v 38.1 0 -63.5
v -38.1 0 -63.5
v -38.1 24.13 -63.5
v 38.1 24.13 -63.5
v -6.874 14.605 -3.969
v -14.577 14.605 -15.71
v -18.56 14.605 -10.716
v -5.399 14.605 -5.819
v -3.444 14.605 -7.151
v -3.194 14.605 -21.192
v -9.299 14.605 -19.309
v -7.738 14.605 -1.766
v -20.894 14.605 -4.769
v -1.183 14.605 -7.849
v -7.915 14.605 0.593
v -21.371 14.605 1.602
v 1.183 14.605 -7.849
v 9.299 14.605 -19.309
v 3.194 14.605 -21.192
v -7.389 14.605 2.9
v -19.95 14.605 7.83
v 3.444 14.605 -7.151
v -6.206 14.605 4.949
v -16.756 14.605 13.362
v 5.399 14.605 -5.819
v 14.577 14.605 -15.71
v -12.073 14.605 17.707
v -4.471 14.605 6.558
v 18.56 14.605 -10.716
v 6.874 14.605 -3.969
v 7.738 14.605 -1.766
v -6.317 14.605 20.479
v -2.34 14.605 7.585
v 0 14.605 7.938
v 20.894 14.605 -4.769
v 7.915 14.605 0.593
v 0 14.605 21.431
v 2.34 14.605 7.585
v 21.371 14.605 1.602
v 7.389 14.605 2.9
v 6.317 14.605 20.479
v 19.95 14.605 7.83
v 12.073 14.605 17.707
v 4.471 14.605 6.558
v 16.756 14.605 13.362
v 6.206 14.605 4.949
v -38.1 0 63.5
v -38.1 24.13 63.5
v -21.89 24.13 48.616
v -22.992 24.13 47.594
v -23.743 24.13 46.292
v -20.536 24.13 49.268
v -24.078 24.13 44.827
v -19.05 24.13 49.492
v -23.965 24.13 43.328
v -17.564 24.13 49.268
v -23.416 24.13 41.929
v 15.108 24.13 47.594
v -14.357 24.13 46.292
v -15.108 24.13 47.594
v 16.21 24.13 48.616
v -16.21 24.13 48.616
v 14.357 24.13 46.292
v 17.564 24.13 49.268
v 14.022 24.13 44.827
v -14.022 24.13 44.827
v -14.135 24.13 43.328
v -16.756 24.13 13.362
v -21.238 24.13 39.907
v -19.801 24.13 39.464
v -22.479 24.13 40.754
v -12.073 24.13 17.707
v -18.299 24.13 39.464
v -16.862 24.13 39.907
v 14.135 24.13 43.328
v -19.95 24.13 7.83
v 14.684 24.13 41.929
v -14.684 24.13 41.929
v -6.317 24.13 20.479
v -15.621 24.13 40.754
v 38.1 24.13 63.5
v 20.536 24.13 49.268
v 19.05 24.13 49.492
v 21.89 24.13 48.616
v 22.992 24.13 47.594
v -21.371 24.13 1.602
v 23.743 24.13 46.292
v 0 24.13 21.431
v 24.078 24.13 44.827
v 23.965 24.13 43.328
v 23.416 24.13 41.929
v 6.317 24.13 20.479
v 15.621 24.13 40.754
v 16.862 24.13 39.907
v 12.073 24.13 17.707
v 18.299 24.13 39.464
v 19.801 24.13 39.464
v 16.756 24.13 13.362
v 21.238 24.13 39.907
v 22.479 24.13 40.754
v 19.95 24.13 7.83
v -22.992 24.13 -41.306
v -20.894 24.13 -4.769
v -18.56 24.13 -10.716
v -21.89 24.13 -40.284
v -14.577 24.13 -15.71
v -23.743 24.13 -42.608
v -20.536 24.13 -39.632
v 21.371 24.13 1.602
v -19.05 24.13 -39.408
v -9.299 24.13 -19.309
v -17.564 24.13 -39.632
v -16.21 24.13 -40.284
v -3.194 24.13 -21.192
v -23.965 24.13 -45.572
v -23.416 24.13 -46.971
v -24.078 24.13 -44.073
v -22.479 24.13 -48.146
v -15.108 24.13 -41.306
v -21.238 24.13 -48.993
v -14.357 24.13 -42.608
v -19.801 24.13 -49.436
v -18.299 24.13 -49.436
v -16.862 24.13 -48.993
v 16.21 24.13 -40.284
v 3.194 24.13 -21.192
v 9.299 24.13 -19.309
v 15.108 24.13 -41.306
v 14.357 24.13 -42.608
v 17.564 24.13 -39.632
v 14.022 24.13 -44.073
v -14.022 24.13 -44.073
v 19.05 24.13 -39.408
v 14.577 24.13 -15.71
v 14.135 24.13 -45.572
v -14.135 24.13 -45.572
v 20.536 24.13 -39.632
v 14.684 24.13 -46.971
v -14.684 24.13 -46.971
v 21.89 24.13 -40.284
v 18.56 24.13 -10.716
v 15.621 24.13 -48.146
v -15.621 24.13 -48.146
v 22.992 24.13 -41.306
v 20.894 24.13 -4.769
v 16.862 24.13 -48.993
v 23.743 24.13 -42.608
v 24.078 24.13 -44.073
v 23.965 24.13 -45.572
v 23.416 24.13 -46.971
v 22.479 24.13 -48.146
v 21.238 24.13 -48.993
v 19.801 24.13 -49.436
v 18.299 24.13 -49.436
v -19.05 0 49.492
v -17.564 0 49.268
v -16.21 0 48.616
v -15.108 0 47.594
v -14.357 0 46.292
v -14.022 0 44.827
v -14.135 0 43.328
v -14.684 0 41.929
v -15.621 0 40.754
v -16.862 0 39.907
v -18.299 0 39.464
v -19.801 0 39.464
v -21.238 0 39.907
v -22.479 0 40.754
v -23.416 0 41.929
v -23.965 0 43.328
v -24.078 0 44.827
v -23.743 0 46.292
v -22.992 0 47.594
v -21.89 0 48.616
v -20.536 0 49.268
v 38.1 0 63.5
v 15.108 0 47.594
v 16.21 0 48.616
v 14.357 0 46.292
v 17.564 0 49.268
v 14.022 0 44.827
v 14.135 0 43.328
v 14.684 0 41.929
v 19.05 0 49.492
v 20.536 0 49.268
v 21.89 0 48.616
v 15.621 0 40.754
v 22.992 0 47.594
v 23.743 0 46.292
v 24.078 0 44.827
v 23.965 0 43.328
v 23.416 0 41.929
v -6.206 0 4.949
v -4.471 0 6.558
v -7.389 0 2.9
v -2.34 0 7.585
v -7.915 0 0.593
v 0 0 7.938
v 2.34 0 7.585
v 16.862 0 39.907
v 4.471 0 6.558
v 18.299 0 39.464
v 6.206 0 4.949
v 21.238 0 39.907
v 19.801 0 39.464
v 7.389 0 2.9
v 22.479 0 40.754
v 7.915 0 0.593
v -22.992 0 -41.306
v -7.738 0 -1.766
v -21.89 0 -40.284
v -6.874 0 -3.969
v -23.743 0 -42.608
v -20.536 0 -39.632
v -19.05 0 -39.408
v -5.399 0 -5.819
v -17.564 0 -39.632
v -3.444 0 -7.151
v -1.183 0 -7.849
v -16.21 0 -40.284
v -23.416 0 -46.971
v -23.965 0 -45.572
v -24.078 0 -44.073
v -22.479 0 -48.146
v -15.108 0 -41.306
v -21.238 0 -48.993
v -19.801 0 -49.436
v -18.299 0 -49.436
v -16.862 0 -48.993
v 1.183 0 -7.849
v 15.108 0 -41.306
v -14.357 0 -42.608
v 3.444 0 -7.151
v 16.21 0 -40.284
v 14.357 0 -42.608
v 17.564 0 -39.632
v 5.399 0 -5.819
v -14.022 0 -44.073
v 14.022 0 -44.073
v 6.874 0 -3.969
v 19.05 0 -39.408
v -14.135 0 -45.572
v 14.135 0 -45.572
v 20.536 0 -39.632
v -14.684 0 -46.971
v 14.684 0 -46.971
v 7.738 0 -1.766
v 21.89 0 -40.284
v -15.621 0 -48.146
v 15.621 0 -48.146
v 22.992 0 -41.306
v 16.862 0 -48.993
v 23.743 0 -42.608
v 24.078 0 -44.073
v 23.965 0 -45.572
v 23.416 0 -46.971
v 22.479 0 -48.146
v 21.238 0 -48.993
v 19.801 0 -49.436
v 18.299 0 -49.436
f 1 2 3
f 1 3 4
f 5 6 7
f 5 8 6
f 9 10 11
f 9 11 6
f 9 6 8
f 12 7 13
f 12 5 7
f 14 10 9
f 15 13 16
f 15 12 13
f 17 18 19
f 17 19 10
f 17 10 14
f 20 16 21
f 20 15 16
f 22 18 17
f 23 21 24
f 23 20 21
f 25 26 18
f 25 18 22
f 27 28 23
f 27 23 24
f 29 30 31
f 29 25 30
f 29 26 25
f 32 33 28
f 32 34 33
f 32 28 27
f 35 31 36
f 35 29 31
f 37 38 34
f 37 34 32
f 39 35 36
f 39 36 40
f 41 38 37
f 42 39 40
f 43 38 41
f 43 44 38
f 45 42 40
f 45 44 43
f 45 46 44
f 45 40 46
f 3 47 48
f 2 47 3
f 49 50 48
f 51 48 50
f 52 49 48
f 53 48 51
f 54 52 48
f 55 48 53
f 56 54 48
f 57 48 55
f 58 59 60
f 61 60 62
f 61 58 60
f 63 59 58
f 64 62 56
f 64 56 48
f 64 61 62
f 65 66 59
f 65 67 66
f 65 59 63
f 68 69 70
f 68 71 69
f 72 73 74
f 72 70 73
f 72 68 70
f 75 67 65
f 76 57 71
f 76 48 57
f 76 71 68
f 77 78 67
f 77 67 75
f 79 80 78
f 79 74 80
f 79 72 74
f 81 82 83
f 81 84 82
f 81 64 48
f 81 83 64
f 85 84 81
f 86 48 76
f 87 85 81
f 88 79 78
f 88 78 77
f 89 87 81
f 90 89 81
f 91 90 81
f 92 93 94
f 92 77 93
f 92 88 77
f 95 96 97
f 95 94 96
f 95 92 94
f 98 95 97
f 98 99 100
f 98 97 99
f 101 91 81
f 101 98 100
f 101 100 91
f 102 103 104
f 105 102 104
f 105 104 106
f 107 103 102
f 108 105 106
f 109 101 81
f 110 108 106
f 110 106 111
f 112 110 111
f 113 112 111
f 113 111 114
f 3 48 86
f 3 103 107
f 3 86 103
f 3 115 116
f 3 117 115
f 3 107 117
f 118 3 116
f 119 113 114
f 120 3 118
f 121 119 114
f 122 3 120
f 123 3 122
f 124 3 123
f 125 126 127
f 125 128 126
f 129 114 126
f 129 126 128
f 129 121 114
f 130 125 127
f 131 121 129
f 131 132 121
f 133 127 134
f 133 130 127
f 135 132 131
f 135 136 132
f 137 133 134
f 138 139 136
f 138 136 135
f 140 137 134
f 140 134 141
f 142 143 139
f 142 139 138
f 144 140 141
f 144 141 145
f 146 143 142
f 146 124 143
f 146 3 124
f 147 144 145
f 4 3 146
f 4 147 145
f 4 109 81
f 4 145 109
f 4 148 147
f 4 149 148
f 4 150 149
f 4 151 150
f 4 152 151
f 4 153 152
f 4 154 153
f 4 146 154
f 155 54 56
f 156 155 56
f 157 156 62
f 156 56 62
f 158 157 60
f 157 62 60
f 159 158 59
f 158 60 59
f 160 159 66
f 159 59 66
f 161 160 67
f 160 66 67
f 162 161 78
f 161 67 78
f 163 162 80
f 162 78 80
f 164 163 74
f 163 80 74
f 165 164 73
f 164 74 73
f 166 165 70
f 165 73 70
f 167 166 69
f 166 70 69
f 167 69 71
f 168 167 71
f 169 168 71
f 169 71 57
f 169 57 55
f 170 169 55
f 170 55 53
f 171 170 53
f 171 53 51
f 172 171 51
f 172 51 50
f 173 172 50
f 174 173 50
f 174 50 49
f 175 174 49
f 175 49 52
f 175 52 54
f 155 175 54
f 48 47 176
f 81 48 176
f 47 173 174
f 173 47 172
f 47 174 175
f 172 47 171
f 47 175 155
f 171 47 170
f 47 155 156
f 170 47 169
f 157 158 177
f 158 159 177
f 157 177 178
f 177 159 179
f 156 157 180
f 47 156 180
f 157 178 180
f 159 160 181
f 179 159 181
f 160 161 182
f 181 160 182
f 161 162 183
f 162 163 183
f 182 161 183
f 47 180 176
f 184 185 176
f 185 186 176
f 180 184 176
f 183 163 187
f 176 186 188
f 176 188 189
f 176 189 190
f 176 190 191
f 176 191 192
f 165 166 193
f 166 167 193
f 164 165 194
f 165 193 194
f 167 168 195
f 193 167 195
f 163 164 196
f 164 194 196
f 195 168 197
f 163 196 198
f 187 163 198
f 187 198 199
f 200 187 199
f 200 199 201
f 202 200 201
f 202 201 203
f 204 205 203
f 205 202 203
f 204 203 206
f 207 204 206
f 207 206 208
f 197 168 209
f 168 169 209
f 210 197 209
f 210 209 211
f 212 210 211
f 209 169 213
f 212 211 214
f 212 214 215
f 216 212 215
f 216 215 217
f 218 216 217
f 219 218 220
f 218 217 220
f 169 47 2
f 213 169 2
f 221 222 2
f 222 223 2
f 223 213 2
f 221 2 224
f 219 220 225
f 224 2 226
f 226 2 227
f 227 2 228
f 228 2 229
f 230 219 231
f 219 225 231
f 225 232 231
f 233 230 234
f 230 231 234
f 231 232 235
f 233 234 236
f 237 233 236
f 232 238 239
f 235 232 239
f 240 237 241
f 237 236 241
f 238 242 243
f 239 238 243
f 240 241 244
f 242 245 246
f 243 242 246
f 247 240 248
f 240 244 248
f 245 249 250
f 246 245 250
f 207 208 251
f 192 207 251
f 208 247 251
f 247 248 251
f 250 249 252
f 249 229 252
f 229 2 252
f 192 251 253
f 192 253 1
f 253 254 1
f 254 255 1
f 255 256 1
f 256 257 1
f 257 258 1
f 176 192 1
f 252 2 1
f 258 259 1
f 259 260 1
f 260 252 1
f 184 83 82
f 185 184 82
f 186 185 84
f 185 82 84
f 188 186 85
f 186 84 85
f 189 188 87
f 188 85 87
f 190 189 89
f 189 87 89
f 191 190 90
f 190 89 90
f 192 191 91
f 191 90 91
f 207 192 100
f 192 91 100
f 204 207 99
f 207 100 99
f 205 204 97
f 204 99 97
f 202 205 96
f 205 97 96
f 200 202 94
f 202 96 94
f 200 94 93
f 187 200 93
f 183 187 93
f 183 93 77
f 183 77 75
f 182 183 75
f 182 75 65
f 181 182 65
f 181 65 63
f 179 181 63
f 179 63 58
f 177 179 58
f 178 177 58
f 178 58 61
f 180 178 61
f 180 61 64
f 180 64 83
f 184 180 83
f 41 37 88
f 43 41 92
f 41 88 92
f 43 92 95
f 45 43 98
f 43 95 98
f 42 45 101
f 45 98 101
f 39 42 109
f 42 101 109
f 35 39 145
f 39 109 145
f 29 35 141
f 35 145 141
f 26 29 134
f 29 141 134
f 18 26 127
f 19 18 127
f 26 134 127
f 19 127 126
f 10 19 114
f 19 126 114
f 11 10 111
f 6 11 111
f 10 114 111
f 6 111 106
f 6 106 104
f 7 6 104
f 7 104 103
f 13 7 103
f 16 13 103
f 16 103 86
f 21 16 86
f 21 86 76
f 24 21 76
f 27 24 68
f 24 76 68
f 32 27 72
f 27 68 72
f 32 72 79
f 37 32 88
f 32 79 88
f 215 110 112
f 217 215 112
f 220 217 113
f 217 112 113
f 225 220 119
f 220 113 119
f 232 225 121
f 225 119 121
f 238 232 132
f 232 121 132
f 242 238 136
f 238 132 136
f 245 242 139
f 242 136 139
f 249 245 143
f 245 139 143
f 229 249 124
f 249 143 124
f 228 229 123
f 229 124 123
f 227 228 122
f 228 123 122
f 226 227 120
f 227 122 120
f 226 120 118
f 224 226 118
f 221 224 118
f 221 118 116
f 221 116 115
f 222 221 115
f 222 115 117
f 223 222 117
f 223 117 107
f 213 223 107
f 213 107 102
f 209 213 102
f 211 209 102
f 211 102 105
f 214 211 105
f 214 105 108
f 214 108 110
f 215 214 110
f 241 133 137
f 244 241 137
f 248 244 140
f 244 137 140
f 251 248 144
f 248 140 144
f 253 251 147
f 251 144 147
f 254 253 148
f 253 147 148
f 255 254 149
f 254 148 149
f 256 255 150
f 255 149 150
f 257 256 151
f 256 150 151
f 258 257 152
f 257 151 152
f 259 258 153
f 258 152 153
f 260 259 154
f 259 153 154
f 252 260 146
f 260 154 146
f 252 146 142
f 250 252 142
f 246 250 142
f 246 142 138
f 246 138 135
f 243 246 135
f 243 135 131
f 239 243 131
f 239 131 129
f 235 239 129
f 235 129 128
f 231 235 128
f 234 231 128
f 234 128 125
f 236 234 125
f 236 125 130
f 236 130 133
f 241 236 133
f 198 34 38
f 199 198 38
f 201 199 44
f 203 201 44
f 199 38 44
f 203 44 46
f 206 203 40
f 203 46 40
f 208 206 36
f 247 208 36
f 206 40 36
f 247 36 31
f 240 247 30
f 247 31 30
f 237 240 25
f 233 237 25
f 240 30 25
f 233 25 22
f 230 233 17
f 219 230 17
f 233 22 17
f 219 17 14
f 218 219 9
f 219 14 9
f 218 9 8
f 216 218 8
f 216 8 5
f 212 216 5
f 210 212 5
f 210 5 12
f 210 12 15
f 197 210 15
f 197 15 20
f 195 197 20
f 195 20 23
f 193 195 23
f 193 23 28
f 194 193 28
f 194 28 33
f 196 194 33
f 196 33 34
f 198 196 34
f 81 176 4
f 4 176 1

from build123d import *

# Parameters (mm, degrees)
SKETCH1_W                    = 76.2
SKETCH1_H                    = 127
BOSS_EXTRUDE1_DEPTH          = 24.13
SKETCH2_R                    = 7.9375
F_1_2_13_THREADED_HOLE_DEPTH = 78.885280381
SKETCH3_R                    = 5.0419
F_3_8_THROUGH_HOLES_DEPTH    = 78.885280381
SKETCH4_R                    = 21.43125
CUT_EXTRUDE1_DEPTH           = 9.525


with BuildPart() as part:
    # Sketch1 → Boss-Extrude1 (new body)
    with BuildSketch(Plane(origin=(0, 0, 0), x_dir=(1, 0, 0), z_dir=(0, 1, 0))):
        Rectangle(SKETCH1_W, SKETCH1_H)
    extrude(amount=BOSS_EXTRUDE1_DEPTH)

    # Sketch2 → 1/2"-13 Threaded Hole (cut, through all)
    with BuildSketch(Plane(origin=(0, 24.13, 0), x_dir=(1, 0, 0), z_dir=(0, 1, 0))):
        with Locations(Location((0, 0, 0), (0, 0, 270))):
            Circle(SKETCH2_R)
    extrude(amount=-F_1_2_13_THREADED_HOLE_DEPTH, mode=Mode.SUBTRACT)

    # Sketch3 → 3/8" Through Holes (cut, through all)
    with BuildSketch(Plane(origin=(0, 24.13, 0), x_dir=(1, 0, 0), z_dir=(0, 1, 0))):
        with Locations(Location((-19.05, 44.45, 0), (0, 0, 270))):
            Circle(SKETCH3_R)
        with Locations(Location((19.05, 44.45, 0), (0, 0, 270))):
            Circle(SKETCH3_R)
        with Locations(Location((19.05, -44.45, 0), (0, 0, 270))):
            Circle(SKETCH3_R)
        with Locations(Location((-19.05, -44.45, 0), (0, 0, 270))):
            Circle(SKETCH3_R)
    extrude(amount=-F_3_8_THROUGH_HOLES_DEPTH, mode=Mode.SUBTRACT)

    # Sketch4 → Cut-Extrude1 (cut)
    with BuildSketch(Plane(origin=(0, 24.13, 0), x_dir=(1, 0, 0), z_dir=(0, 1, 0))):
        with Locations(Location((0, 0, 0), (0, 0, 270))):
            Circle(SKETCH4_R)
    extrude(amount=-CUT_EXTRUDE1_DEPTH, mode=Mode.SUBTRACT)


solid = part.part
